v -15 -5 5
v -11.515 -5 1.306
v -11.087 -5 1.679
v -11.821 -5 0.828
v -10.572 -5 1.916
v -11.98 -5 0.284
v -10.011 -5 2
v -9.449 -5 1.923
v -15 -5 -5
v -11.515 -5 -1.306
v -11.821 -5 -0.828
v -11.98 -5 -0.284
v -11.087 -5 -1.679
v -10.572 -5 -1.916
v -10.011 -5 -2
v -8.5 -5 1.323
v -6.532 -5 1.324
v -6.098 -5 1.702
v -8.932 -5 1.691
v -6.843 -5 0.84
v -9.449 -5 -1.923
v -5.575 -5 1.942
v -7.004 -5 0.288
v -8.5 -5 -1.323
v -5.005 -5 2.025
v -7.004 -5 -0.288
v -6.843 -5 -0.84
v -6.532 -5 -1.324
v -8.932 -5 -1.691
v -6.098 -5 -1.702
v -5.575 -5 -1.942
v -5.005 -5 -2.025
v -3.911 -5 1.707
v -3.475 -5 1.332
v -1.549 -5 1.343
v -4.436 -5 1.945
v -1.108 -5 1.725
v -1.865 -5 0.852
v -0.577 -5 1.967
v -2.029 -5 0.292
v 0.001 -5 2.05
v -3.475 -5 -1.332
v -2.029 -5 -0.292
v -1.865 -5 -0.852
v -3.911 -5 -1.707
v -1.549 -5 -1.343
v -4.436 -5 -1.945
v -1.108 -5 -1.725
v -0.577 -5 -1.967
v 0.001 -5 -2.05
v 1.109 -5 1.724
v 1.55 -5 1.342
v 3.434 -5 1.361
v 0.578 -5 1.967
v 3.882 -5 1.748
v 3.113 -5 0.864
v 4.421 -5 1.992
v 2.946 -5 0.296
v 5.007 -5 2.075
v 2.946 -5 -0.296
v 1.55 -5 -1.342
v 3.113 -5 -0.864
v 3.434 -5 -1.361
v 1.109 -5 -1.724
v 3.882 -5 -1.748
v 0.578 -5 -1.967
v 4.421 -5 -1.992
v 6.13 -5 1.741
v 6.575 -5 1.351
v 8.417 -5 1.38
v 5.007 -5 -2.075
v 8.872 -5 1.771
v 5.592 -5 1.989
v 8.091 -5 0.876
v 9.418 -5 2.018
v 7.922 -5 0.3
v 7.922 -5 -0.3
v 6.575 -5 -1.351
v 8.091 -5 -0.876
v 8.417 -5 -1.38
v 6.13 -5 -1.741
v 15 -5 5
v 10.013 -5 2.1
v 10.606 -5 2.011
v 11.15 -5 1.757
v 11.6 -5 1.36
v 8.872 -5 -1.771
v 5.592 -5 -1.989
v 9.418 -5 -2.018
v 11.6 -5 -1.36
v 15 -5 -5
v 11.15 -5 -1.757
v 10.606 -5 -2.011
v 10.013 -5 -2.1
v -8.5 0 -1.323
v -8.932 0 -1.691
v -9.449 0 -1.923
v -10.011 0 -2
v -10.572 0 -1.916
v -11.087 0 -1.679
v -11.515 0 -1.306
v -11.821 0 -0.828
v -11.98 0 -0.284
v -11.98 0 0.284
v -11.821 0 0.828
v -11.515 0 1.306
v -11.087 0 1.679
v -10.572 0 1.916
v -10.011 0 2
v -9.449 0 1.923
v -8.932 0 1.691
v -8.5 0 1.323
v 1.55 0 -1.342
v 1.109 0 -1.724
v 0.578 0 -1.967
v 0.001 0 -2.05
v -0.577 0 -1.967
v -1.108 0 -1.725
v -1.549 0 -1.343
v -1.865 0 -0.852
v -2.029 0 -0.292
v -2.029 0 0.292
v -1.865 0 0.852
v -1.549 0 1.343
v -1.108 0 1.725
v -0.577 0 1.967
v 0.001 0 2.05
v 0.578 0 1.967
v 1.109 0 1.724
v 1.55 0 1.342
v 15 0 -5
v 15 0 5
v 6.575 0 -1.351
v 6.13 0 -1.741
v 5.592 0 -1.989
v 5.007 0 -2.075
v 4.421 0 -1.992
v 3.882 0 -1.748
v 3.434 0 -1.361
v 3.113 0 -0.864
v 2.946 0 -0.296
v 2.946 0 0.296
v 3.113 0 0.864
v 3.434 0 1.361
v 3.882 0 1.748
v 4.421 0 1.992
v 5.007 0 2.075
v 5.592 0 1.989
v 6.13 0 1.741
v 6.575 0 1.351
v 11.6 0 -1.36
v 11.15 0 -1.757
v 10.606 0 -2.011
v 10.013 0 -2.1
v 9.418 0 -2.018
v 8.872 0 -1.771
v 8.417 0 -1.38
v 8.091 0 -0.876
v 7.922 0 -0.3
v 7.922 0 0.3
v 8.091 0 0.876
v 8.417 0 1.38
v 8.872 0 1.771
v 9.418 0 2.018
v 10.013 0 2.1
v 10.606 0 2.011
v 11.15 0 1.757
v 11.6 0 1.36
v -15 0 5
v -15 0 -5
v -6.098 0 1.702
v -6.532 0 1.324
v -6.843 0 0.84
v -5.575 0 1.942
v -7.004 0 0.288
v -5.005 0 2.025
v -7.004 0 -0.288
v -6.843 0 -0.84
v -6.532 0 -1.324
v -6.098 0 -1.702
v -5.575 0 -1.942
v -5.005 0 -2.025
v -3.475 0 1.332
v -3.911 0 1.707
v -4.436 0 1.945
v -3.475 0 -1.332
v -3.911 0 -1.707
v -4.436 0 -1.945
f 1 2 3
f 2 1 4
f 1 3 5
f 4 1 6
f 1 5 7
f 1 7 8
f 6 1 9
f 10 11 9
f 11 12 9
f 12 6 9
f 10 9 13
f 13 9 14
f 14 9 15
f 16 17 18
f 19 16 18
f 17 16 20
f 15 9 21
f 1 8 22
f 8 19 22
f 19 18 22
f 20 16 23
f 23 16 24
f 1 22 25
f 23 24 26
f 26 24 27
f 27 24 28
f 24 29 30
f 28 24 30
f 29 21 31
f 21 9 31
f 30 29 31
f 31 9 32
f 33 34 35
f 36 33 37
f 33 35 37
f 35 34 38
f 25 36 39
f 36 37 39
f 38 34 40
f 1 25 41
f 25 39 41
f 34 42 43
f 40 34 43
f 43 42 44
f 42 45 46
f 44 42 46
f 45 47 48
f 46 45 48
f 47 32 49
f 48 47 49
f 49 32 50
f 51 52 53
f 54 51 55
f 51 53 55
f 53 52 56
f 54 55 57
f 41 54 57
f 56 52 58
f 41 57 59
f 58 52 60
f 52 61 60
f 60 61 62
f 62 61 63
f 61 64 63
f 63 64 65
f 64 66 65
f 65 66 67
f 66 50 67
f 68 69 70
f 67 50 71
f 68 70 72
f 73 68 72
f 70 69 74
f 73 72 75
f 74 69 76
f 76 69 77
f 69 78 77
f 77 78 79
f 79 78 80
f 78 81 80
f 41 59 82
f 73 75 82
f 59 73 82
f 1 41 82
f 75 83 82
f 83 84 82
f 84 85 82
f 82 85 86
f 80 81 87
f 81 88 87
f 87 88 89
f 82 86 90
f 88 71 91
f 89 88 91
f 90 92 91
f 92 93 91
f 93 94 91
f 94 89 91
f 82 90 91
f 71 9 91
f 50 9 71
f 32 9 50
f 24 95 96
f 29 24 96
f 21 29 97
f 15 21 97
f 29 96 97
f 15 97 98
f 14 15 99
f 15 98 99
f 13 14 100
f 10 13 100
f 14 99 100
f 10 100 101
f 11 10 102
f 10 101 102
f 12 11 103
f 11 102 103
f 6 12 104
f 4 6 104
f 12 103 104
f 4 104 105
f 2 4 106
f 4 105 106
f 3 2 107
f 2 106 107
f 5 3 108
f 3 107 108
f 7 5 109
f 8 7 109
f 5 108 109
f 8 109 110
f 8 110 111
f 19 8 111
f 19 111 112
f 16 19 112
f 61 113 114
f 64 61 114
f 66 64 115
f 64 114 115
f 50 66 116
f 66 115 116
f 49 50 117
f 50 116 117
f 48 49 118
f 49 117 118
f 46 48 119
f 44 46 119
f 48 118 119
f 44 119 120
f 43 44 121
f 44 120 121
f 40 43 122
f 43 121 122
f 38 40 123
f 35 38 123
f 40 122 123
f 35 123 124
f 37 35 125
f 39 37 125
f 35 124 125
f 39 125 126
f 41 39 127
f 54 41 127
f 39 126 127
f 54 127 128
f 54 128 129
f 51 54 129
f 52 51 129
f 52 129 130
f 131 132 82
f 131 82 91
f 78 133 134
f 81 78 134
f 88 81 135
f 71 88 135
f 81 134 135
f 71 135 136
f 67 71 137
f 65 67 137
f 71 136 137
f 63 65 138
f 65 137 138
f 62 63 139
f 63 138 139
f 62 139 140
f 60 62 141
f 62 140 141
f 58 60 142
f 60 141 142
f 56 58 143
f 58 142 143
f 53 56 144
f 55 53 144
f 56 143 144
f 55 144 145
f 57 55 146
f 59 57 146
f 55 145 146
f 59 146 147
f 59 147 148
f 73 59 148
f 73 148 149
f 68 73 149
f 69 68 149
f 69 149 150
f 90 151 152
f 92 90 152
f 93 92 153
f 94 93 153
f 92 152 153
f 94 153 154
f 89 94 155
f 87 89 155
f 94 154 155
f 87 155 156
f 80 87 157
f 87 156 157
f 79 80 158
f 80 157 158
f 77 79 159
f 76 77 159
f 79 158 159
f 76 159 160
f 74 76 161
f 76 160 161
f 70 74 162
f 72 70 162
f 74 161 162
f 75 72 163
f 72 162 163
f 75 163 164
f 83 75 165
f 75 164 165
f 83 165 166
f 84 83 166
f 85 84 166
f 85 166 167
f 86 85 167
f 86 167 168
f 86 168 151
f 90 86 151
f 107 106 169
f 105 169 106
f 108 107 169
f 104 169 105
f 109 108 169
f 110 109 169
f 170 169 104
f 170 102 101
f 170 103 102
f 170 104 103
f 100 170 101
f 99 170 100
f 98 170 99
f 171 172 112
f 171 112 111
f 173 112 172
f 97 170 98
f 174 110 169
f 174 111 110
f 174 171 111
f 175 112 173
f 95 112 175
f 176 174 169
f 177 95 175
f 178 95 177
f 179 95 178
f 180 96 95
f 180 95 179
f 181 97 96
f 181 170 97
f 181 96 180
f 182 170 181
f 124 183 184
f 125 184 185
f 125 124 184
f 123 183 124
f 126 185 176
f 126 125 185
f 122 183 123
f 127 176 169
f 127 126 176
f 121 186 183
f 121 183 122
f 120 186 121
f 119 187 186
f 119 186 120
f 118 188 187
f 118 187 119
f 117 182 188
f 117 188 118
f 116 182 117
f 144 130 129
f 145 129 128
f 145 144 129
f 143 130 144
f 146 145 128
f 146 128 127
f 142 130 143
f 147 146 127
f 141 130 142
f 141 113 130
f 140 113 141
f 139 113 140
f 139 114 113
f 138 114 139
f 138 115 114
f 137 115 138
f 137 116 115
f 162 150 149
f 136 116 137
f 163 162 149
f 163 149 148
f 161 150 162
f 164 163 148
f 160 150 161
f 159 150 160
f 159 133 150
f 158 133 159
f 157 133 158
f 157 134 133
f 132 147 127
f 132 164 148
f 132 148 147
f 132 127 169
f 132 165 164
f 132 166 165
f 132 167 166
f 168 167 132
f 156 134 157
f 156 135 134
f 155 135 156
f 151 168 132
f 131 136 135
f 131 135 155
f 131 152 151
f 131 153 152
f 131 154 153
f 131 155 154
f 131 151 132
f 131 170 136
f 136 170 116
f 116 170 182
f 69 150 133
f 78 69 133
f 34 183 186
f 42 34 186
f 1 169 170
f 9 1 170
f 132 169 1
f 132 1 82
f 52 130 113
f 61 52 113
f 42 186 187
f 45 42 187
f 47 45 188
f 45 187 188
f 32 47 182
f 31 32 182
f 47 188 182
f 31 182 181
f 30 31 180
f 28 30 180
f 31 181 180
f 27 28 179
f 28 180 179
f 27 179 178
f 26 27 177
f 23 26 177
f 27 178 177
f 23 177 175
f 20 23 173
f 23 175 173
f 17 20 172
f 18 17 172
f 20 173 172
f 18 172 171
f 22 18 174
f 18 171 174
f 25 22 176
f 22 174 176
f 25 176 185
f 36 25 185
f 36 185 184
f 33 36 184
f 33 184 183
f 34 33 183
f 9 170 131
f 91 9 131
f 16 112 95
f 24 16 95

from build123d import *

# Parameters (mm, degrees)
SKETCH1_W           = 30
SKETCH1_H           = 10
BOSS_EXTRUDE1_DEPTH = 5


with BuildPart() as part:
    # Sketch1 → Boss-Extrude1 (new body)
    with BuildSketch(Plane(origin=(0, 0, 0), x_dir=(1, 0, 0), z_dir=(0, 1, 0))):
        Rectangle(SKETCH1_W, SKETCH1_H)
        with BuildLine():
            ThreePointArc((11.6, 1.360147051), (7.9, 0), (11.6, -1.360147051))
            Line((11.6, -1.360147051), (11.6, 1.360147051))
        make_face(mode=Mode.SUBTRACT)
        with BuildLine():
            ThreePointArc((6.575, 1.350925609), (2.925, 0), (6.575, -1.350925609))
            Line((6.575, -1.350925609), (6.575, 1.350925609))
        make_face(mode=Mode.SUBTRACT)
        with BuildLine():
            ThreePointArc((1.55, 1.341640786), (-2.05, 0), (1.55, -1.341640786))
            Line((1.55, -1.341640786), (1.55, 1.341640786))
        make_face(mode=Mode.SUBTRACT)
        with BuildLine():
            ThreePointArc((-3.475, 1.332291259), (-7.025, 0), (-3.475, -1.332291259))
            Line((-3.475, -1.332291259), (-3.475, 1.332291259))
        make_face(mode=Mode.SUBTRACT)
        with BuildLine():
            ThreePointArc((-8.5, 1.322875656), (-12, 0), (-8.5, -1.322875656))
            Line((-8.5, -1.322875656), (-8.5, 1.322875656))
        make_face(mode=Mode.SUBTRACT)
    extrude(amount=-BOSS_EXTRUDE1_DEPTH)


solid = part.part
